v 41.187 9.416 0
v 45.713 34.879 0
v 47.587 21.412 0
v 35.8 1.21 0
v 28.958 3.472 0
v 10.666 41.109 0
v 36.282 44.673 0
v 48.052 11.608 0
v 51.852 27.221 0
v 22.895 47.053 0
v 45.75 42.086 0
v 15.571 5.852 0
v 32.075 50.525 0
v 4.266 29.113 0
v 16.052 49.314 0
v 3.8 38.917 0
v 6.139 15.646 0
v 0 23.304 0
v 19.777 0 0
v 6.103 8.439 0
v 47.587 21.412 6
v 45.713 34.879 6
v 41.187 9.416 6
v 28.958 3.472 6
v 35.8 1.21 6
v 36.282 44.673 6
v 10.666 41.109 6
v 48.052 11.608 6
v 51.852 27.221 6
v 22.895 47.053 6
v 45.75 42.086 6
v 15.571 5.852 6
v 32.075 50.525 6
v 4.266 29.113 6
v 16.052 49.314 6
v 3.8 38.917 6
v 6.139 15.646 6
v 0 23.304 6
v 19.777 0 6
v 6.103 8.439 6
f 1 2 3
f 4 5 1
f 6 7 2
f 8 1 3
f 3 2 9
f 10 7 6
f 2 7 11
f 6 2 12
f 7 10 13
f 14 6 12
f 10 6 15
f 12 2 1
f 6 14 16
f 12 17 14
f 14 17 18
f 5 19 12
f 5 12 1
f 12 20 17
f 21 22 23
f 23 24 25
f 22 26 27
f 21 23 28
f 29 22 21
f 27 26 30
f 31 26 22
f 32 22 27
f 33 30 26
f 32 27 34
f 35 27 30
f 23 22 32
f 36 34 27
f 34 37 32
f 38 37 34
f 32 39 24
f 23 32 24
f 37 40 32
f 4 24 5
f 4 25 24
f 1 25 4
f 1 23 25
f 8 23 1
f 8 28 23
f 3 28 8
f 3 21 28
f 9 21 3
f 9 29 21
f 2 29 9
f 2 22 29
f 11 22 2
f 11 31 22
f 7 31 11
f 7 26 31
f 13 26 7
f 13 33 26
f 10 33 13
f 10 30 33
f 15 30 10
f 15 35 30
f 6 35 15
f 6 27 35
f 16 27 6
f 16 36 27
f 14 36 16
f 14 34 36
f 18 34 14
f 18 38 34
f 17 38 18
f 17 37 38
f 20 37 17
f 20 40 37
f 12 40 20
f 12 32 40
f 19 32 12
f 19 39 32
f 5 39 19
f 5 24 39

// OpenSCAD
$fn = 32;

// ----------------------------------------------------------------------
// Chain sprocket: 10 teeth, 22 mm root radius
// ----------------------------------------------------------------------

// --- parameters (mm) ---
profile_height = 6;       // extrusion height
profile_points = 20;      // points of the closed outline

profile = [[47.587, 21.412], [51.852, 27.221], [45.713, 34.879], [45.75, 42.086], [36.282, 44.673], [32.075, 50.525], [22.895, 47.053], [16.052, 49.314], [10.666, 41.109], [3.8, 38.917], [4.266, 29.113], [0, 23.304], [6.139, 15.646], [6.103, 8.439], [15.571, 5.852], [19.777, 0], [28.958, 3.472], [35.8, 1.21], [41.187, 9.416], [48.052, 11.608]];  // single closed polygon, 20 points, counter clockwise

// --- the one profile operation ---
linear_extrude(height = profile_height) polygon(points = profile);
